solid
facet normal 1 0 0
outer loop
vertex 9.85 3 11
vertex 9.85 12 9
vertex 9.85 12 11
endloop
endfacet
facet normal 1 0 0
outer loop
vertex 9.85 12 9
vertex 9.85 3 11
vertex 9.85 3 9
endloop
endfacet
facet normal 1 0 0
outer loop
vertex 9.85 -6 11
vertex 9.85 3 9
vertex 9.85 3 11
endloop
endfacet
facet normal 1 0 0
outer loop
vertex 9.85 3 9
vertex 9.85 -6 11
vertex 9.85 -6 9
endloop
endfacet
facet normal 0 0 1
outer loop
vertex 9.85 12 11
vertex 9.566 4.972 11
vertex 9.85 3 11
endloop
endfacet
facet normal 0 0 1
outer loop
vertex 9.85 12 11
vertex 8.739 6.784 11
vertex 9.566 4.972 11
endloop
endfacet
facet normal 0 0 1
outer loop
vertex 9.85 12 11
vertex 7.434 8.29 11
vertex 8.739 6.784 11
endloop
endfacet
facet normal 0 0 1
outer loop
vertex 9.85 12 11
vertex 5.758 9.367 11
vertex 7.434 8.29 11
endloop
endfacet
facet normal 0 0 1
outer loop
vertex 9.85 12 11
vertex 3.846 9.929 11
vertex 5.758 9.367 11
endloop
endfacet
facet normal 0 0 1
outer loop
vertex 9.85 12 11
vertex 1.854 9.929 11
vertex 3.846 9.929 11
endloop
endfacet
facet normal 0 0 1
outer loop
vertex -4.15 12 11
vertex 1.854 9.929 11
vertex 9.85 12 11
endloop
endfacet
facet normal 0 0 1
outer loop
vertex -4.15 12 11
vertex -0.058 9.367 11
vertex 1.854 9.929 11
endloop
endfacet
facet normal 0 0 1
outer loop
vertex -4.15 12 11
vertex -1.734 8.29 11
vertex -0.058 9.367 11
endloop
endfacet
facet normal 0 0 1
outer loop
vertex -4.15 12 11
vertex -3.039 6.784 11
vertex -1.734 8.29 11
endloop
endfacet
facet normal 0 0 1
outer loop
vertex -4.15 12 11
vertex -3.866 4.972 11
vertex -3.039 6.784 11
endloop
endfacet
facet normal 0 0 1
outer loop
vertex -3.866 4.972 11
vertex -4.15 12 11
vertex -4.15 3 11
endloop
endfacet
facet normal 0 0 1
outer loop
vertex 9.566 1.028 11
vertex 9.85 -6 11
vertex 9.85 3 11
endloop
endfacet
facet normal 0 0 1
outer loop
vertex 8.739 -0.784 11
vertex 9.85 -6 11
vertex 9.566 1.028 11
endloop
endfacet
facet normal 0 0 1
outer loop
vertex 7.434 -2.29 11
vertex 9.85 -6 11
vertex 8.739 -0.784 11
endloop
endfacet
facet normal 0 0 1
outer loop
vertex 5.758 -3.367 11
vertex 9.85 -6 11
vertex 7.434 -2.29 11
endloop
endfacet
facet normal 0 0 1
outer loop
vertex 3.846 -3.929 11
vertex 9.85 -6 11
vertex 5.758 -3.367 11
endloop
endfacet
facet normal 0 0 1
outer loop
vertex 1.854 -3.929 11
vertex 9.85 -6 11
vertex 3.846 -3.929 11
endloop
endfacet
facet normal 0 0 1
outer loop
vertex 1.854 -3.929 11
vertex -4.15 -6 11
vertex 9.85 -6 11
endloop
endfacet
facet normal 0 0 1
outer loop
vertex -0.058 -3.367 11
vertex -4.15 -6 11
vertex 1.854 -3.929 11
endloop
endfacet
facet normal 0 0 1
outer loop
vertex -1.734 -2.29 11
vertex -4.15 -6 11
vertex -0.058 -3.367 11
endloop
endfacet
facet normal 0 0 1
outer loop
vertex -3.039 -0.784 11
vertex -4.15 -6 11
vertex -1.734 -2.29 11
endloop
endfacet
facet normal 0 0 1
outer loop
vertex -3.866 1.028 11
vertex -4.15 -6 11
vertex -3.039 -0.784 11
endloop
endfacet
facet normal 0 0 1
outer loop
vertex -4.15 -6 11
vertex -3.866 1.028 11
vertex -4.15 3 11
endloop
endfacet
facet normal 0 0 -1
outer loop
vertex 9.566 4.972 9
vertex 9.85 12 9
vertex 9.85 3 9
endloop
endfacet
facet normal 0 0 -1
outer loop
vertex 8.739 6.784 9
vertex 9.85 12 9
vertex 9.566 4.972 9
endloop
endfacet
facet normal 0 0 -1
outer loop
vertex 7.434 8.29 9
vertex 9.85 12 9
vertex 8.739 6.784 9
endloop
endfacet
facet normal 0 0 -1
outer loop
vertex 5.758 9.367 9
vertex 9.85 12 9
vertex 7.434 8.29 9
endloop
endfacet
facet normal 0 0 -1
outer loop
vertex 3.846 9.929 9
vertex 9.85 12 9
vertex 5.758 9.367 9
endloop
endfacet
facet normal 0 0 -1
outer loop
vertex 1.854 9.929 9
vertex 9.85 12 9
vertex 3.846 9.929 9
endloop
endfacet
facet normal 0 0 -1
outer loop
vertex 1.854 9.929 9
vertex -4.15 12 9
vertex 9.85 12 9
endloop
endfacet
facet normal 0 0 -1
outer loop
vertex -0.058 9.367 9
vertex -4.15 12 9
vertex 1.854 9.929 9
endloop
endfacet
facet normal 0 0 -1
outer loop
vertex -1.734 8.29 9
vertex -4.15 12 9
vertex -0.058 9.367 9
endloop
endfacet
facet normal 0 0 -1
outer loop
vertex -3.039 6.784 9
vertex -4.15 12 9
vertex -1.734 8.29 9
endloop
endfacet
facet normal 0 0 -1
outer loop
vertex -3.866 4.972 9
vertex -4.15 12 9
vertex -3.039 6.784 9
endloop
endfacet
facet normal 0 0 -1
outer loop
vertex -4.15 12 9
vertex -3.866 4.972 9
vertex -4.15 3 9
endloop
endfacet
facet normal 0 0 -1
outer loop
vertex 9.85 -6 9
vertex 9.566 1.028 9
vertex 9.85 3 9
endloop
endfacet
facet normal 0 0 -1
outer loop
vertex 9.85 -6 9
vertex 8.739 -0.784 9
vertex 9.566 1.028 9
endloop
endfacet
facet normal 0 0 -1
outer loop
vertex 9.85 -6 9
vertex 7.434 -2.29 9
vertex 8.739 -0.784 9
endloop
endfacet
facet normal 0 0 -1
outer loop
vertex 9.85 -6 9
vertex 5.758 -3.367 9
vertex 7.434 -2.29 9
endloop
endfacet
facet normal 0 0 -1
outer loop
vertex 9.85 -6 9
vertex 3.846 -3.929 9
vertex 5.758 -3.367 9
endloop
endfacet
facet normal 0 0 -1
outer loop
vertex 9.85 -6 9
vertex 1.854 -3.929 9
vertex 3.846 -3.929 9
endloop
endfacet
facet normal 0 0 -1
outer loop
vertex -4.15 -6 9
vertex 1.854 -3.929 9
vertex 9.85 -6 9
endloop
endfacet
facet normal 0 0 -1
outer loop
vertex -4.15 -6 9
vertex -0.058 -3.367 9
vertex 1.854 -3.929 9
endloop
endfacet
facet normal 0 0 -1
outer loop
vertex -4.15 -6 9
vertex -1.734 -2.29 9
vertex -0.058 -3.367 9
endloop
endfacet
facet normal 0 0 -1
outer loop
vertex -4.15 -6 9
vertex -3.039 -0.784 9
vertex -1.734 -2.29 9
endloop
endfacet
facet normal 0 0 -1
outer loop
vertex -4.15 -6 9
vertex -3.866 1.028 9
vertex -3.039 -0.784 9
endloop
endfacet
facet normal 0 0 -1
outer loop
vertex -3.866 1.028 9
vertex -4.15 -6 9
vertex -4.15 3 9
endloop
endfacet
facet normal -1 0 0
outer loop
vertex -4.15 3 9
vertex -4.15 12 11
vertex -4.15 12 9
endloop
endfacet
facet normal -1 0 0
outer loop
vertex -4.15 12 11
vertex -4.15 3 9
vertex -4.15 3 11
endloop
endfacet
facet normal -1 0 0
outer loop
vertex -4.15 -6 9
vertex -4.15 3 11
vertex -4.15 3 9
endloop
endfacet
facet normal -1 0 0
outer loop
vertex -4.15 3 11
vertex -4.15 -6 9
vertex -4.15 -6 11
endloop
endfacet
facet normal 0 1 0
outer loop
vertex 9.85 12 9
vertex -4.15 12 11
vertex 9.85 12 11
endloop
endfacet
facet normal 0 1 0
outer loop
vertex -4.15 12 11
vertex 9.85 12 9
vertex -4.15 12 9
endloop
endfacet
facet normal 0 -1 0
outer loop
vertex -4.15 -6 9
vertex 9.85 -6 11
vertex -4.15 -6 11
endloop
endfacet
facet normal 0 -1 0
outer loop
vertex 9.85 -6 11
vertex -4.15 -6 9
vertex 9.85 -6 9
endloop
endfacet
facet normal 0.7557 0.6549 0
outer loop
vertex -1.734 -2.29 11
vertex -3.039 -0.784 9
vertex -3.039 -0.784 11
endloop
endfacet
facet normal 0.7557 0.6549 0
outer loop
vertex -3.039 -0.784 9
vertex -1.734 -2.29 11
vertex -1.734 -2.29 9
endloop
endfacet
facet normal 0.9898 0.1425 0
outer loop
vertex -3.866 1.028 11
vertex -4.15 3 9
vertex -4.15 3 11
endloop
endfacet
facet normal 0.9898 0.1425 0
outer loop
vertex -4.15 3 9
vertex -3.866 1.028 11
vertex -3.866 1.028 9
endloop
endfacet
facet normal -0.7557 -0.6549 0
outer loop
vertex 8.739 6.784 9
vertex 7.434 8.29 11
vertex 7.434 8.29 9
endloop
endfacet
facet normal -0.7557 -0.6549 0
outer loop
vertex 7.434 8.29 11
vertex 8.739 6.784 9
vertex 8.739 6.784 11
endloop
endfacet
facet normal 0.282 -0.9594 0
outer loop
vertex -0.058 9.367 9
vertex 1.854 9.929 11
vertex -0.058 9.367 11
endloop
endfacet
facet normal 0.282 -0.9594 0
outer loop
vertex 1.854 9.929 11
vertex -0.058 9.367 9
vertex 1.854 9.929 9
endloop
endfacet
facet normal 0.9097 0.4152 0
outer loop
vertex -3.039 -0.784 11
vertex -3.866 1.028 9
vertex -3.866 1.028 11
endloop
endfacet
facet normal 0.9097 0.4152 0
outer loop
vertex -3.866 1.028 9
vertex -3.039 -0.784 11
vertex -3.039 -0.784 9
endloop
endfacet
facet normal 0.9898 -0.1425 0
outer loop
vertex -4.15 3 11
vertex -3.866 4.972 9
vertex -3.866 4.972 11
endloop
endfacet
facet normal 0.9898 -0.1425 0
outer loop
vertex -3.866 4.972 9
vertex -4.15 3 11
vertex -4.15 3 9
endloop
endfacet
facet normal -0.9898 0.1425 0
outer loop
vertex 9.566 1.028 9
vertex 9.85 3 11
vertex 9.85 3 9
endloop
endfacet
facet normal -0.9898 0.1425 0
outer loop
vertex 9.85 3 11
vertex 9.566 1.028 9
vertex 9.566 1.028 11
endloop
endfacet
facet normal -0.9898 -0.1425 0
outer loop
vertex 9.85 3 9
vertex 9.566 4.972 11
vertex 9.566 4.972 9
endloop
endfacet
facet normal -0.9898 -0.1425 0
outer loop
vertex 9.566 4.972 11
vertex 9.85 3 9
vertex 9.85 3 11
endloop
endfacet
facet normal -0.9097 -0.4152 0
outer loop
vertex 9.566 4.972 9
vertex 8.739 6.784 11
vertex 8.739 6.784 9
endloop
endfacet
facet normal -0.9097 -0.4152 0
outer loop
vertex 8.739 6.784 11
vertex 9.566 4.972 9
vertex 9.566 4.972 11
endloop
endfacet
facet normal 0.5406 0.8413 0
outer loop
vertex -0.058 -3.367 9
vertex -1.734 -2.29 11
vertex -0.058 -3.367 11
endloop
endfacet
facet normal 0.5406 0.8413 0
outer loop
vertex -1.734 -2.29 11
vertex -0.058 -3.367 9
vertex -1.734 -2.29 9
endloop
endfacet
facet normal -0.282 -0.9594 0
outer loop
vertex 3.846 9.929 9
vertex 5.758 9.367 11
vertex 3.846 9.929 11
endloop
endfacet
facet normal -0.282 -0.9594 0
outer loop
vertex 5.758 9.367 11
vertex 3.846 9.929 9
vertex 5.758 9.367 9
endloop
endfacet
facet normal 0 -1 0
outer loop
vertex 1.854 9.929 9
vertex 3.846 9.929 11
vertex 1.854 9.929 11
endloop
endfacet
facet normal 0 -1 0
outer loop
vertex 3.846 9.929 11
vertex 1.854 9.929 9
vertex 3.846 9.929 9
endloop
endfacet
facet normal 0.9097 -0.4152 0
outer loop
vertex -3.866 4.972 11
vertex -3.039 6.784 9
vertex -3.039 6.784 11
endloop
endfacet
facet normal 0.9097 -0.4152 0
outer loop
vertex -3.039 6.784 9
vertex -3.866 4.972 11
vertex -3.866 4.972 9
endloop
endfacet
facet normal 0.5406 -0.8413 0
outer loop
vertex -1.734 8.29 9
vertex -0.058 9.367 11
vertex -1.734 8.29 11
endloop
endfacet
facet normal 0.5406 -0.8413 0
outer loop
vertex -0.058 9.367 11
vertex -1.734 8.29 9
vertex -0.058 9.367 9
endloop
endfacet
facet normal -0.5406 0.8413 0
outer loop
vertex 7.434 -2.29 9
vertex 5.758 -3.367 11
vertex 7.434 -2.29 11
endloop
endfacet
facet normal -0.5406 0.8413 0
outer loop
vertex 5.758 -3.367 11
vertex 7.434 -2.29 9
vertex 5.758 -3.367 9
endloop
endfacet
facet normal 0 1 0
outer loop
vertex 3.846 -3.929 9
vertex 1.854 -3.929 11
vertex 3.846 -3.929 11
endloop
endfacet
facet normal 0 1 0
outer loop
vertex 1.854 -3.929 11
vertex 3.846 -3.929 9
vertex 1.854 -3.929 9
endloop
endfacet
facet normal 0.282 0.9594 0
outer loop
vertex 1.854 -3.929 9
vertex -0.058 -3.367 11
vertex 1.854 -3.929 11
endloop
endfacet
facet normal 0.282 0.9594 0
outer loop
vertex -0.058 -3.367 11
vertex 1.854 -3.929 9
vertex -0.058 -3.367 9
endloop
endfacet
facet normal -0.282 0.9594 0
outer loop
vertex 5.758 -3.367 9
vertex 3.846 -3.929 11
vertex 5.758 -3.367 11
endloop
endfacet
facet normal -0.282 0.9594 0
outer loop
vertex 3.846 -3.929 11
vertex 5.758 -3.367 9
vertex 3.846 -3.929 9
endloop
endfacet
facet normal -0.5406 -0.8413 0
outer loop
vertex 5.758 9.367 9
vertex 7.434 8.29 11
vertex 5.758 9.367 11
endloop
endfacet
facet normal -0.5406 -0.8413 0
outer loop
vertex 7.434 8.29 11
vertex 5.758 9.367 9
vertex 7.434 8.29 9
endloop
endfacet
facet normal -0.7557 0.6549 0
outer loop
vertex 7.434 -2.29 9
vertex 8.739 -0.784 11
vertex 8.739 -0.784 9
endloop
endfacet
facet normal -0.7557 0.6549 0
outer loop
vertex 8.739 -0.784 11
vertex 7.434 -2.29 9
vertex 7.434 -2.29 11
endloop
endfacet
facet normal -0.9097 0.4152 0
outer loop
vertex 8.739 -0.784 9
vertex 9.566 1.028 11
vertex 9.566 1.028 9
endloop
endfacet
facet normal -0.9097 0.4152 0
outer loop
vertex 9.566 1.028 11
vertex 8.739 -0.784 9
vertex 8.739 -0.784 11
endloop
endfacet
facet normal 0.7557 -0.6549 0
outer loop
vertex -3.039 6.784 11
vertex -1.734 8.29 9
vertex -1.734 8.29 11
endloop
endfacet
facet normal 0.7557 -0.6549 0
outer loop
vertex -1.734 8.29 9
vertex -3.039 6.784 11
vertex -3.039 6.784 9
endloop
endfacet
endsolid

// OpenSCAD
translate([2.85,3,10]){
  difference() {
    cube(size=[14,18,2],center=true);
    cylinder(h=4,r=7,center=true);
  }
}
